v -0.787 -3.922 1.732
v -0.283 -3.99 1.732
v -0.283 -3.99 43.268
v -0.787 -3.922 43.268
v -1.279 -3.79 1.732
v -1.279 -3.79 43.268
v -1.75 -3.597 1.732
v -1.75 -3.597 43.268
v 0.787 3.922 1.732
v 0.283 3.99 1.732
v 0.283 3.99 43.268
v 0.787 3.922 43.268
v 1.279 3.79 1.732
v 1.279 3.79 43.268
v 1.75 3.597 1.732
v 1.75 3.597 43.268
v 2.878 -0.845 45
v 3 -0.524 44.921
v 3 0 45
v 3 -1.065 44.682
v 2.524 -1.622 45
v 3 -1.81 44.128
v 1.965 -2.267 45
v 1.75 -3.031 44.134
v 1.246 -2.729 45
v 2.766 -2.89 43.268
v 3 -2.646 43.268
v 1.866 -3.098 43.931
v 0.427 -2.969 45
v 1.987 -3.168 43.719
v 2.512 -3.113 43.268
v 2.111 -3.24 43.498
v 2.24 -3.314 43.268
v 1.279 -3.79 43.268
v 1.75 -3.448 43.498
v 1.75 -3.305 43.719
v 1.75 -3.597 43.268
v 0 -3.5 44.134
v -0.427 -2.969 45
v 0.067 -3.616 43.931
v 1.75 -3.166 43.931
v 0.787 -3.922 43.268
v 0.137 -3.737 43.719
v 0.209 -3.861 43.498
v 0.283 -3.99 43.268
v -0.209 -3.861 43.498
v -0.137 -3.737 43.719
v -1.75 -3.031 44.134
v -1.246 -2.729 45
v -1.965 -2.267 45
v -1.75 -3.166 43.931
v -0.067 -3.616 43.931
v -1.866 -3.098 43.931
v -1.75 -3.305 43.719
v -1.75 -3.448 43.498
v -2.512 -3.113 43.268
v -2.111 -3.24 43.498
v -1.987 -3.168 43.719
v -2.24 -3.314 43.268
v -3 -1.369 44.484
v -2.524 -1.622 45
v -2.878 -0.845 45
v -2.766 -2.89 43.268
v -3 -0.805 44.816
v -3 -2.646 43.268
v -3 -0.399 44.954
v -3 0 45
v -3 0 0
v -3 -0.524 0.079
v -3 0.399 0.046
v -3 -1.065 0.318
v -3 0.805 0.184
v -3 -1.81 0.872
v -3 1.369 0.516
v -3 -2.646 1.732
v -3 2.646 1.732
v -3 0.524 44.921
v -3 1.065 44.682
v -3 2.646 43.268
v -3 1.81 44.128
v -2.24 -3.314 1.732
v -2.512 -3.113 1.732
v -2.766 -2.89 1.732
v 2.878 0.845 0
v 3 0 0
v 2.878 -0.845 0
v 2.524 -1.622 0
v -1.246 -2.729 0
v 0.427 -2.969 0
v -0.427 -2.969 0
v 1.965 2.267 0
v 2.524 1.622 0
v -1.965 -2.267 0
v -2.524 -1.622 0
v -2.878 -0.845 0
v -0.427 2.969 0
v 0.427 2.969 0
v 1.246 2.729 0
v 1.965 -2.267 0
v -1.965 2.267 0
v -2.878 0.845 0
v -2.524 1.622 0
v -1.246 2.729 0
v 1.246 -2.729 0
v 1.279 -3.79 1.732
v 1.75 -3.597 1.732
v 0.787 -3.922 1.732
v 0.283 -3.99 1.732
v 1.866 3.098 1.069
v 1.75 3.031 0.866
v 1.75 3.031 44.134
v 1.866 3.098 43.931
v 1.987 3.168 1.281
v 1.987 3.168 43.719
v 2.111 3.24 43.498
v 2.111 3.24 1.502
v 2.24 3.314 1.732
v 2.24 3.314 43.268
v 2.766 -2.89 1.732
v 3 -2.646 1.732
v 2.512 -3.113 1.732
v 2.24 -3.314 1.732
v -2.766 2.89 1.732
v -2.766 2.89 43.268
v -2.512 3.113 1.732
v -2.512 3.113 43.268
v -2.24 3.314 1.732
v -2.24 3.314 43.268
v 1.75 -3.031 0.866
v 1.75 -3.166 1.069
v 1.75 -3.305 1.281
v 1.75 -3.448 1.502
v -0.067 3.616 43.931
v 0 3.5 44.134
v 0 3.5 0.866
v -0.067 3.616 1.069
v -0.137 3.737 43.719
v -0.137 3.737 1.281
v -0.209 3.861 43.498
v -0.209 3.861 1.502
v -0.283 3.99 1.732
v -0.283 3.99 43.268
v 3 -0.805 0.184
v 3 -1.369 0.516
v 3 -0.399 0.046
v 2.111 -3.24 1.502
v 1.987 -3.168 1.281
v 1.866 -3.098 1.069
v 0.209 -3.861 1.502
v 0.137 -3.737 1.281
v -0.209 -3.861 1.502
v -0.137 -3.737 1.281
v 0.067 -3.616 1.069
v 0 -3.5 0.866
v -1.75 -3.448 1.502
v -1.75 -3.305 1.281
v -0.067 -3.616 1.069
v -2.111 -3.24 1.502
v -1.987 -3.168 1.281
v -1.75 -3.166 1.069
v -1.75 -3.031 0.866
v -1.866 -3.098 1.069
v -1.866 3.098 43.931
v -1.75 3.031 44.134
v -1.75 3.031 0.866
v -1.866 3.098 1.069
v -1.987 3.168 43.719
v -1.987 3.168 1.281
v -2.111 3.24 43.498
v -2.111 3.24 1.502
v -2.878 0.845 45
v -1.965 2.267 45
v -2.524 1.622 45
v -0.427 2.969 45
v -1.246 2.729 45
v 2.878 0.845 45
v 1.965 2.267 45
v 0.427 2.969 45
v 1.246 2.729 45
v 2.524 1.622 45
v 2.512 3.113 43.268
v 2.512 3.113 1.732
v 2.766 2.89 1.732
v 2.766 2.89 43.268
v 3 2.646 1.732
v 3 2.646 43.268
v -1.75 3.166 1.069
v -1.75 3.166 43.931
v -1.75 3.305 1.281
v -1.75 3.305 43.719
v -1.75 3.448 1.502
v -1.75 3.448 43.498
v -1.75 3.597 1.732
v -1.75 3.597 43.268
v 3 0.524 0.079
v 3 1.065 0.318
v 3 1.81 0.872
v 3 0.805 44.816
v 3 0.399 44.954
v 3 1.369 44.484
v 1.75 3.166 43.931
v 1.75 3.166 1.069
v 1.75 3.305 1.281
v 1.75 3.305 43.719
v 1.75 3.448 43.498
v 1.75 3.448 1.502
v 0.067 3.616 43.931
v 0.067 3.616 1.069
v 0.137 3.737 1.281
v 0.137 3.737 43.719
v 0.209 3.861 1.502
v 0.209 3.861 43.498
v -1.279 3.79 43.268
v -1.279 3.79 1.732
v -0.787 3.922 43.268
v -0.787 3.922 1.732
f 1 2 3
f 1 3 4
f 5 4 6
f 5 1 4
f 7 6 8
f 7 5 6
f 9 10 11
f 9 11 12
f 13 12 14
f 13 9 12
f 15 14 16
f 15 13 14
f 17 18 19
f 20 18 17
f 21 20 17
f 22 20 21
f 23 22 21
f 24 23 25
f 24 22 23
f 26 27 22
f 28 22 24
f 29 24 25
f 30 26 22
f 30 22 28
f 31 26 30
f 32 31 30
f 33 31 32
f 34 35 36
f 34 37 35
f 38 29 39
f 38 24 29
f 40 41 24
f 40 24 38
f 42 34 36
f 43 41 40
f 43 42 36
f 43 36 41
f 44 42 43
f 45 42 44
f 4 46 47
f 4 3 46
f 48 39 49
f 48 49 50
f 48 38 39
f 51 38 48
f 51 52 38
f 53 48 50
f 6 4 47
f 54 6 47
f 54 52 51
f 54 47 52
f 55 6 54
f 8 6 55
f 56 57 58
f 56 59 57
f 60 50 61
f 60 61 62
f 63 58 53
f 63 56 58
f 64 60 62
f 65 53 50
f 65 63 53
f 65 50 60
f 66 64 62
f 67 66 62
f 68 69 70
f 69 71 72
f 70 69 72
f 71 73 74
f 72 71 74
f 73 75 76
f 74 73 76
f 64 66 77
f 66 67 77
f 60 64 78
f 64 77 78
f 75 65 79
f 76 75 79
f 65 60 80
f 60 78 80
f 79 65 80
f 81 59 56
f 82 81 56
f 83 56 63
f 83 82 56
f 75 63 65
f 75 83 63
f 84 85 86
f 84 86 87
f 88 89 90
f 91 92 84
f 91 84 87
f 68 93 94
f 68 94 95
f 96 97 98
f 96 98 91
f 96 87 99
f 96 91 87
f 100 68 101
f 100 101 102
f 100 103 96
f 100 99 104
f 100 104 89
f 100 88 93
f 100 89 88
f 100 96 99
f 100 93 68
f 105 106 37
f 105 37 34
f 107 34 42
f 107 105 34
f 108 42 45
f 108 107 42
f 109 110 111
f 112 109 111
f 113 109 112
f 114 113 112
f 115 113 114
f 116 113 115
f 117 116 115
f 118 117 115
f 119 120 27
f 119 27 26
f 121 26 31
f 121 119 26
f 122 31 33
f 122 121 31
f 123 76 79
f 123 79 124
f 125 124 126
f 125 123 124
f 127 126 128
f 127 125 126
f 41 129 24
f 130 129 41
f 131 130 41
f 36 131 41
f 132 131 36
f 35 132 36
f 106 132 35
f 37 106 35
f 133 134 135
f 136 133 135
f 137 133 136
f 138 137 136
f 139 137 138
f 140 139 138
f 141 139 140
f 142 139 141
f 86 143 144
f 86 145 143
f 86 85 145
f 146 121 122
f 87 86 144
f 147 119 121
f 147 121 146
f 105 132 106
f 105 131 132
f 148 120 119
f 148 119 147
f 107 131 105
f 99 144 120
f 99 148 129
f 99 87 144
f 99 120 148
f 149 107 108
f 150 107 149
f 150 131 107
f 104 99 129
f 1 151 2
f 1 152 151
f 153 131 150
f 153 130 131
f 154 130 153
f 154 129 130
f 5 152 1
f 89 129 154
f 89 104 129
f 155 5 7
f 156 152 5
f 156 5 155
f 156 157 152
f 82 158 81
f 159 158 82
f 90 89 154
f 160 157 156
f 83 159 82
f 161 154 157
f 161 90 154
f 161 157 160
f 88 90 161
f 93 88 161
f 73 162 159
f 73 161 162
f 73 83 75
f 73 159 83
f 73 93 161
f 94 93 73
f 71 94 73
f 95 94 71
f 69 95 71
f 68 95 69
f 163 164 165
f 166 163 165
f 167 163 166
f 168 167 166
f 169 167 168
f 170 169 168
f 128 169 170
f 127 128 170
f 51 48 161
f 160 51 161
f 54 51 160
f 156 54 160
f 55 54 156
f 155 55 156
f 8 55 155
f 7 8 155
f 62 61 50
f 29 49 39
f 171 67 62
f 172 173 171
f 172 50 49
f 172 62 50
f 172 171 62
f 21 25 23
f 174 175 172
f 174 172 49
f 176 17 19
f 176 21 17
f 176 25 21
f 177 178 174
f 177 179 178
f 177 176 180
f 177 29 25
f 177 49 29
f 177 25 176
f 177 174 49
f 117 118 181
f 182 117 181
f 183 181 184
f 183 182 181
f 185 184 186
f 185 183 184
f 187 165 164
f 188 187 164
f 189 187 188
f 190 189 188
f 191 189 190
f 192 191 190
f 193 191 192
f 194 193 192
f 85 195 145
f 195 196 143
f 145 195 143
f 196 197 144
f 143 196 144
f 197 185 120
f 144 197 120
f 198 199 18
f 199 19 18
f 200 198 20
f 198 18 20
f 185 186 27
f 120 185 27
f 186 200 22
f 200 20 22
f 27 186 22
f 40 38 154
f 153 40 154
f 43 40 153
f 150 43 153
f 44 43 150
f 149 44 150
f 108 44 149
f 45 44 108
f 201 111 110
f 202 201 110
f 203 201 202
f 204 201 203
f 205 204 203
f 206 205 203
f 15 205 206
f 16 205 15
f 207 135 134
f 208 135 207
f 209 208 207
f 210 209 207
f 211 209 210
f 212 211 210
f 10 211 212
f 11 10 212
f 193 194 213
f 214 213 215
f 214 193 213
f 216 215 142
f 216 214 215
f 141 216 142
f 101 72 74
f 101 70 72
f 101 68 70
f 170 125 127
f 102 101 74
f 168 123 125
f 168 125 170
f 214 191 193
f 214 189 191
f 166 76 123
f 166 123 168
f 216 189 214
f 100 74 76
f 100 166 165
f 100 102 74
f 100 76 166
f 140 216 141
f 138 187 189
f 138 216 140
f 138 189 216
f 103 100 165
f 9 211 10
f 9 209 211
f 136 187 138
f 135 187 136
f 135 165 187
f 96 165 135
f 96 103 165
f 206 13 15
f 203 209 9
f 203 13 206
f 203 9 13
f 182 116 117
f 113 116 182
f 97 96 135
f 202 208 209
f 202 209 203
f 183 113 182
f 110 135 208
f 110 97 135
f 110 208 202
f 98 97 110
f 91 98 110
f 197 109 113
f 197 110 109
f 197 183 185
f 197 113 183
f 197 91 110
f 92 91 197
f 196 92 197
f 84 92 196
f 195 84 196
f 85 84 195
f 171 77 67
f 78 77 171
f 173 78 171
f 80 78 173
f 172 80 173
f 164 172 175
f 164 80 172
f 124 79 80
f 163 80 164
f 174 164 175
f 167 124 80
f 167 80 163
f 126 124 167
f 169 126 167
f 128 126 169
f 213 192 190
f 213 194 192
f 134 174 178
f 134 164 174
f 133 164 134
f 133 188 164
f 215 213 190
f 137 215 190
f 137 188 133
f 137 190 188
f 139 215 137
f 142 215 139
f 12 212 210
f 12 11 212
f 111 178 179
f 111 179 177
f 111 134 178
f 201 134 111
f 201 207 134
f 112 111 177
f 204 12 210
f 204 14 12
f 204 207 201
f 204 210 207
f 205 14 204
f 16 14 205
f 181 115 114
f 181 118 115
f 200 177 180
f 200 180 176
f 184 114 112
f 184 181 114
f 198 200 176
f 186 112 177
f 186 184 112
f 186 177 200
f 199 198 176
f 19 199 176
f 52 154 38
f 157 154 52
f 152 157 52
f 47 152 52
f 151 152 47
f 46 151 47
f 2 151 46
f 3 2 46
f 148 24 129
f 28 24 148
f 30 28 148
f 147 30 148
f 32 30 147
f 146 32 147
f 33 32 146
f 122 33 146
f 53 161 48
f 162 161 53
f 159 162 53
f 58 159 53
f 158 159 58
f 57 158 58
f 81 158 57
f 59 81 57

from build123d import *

# Parameters (mm, degrees)
F3_DEPTH = 45.001
F5_DEPTH = 45.001
F6_COUNT = 12
F7_COUNT = 12


with BuildPart() as f1:
    # F0 (on Front) → F1 (revolve)
    with BuildSketch(Plane.XZ):
        Polygon((-3, 0), (0, 0), (0, 45), (-3, 45), (-4, 43.2679491924), (-4, 1.7320508076), align=None)
    revolve(axis=Axis((0, 0, 22.5), (0, 0, -1)))

    # F2 (on face) → F3 (cut, through all)
    with BuildSketch(Plane.XY.offset(45)):
        with BuildLine():
            Line((-3, 0), (-3, 5))
            ThreePointArc((-3, 5), (-5.8309518948, 0), (-3, -5))
            Line((-3, -5), (-3, 0))
        make_face()
        with BuildLine():
            ThreePointArc((5.8309518948, 0), (5.0740937952, 2.8729030888), (3, 5))
            Line((3, 5), (3, 0))
            Line((3, 0), (3, -5))
            ThreePointArc((3, -5), (5.0740937952, -2.8729030888), (5.8309518948, 0))
        make_face()
    extrude(amount=-F3_DEPTH, mode=Mode.SUBTRACT)

    # F4 (on face) → F5 (cut, through all)
    with BuildSketch(Plane.XY.offset(45)):
        Polygon((0.813057266, 4.9082564943), (-0.813057266, 4.9082564943), (0, 3.5), align=None)
        Polygon((0.813057266, -4.9082564943), (0, -3.5), (-0.813057266, -4.9082564943), align=None)
    f5 = extrude(amount=-F5_DEPTH, mode=Mode.SUBTRACT)

    # F6: F5 ×12 about axis
    f6_axis = Axis((0, 0, 45), (0, 0, -1))
    for i in range(1, F6_COUNT):
        add(f5.solids().sort_by_distance((0.406529, 4.204128, 22.4995))[0].rotate(f6_axis, i * 360 / F6_COUNT), mode=Mode.SUBTRACT)

    # F7: F5 ×12 about axis
    f7_axis = Axis((0, 0, 45), (0, 0, 1))
    for i in range(1, F7_COUNT):
        add(f5.solids().sort_by_distance((0.406529, -4.204128, 22.4995))[0].rotate(f7_axis, i * 360 / F7_COUNT), mode=Mode.SUBTRACT)


solid = f1.part
